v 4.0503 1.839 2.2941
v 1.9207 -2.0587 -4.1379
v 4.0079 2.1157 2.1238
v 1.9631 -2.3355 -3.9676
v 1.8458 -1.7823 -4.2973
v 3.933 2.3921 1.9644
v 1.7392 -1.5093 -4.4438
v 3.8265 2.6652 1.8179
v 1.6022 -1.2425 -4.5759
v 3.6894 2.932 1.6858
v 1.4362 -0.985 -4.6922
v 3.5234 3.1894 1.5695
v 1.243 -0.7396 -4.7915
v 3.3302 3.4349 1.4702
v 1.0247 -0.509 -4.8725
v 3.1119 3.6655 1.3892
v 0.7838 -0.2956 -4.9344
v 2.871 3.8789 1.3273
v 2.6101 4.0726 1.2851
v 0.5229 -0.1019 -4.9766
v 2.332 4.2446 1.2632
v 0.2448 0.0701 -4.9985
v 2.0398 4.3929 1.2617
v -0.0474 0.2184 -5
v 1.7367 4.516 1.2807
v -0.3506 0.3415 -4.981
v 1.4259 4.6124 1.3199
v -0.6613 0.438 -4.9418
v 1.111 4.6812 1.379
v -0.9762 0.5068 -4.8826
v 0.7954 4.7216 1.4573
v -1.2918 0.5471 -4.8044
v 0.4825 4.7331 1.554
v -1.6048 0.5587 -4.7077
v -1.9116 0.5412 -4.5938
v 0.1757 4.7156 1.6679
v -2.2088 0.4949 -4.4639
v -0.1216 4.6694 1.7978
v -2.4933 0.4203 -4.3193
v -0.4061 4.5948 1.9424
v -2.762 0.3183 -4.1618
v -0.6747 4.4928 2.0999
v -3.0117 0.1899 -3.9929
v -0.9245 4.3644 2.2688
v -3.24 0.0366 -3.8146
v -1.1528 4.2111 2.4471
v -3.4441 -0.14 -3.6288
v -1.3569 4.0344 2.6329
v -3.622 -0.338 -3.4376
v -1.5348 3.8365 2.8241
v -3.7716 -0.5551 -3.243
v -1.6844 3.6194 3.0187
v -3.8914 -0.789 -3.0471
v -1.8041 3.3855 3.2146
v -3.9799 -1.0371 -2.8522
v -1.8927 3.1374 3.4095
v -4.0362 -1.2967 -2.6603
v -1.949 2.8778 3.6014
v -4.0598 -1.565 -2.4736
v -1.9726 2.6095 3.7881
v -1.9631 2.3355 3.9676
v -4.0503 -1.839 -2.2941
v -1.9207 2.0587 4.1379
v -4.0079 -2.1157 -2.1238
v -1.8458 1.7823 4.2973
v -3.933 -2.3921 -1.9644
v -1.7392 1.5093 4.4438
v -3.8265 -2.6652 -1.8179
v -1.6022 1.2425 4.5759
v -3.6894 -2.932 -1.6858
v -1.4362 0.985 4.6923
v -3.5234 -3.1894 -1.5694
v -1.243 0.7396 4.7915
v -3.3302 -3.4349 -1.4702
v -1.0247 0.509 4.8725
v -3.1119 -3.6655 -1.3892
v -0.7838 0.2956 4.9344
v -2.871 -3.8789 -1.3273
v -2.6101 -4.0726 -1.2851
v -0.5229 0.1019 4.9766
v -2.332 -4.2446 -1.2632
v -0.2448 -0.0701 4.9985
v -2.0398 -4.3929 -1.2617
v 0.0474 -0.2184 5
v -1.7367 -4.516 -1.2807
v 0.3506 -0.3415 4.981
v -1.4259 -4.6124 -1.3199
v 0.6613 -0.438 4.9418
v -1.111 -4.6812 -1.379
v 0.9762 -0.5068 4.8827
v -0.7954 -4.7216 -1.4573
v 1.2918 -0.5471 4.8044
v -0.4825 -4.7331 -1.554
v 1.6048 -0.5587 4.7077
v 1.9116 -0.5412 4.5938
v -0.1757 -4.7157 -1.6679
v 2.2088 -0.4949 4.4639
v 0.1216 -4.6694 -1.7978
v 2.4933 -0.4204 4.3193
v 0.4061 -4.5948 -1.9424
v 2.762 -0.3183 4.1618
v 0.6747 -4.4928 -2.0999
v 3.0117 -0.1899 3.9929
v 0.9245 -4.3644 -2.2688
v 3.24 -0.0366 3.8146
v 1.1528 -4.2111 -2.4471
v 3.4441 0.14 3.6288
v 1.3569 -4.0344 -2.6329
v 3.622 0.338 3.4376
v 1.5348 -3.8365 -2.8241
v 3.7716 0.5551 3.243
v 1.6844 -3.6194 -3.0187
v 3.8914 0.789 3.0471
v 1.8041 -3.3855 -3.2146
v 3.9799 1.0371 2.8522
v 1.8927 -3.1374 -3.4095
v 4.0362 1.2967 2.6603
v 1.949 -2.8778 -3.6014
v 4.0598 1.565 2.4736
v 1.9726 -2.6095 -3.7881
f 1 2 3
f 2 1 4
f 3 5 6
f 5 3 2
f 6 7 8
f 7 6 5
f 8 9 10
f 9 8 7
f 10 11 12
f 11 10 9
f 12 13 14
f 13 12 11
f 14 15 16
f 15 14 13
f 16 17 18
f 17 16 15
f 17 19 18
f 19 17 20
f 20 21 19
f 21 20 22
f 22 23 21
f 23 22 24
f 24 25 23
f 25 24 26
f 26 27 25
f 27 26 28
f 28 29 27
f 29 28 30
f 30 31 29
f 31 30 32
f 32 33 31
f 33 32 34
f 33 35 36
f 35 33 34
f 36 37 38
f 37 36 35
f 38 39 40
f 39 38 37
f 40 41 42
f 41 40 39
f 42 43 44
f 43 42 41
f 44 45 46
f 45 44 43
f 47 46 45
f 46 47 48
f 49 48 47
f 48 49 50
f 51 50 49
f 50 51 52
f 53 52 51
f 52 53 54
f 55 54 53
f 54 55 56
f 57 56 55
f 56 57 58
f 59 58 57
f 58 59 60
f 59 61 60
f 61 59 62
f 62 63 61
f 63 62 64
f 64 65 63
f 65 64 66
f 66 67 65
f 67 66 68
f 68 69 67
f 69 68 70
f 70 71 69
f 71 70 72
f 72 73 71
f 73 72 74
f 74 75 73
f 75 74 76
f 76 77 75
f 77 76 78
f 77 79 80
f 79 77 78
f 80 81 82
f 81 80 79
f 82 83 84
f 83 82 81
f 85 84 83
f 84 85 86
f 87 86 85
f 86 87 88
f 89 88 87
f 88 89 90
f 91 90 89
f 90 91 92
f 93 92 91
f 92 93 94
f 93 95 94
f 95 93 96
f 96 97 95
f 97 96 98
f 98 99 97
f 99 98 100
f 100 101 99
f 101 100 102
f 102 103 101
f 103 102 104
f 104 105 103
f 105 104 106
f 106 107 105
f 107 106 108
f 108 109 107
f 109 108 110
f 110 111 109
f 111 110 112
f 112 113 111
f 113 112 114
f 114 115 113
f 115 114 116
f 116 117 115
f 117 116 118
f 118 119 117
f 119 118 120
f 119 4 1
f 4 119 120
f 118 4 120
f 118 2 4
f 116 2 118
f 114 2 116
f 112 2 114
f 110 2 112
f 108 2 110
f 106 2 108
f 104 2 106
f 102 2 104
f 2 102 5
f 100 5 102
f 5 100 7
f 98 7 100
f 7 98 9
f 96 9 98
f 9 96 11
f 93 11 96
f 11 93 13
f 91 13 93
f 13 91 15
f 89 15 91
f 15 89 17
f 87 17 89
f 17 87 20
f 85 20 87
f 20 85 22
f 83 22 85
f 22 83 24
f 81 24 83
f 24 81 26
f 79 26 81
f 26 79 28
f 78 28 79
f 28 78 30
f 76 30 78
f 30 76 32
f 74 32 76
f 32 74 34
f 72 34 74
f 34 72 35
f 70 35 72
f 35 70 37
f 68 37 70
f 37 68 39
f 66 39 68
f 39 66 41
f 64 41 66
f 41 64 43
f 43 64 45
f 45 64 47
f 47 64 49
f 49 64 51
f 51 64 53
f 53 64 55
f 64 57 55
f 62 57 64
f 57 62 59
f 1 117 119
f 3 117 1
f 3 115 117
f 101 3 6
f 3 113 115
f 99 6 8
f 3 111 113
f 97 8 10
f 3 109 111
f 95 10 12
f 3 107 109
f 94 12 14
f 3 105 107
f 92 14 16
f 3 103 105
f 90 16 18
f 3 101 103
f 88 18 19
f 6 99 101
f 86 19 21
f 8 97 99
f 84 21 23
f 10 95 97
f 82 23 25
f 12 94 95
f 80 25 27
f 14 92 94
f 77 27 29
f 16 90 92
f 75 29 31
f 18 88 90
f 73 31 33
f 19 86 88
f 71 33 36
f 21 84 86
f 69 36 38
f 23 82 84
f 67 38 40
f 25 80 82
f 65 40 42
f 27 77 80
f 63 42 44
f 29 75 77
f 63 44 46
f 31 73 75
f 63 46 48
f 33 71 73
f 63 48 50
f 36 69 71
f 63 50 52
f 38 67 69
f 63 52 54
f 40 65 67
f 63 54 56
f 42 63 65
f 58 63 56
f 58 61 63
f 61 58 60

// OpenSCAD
translate([-2.15997e-07, -1.43199e-06, 2.25686e-06])
rotate([-33.6901, 15.5013, -4.7196])
cylinder(h = 7.80971, r1 = 3.13084, r2 = 3.13084, center = true, $fn = 60);
